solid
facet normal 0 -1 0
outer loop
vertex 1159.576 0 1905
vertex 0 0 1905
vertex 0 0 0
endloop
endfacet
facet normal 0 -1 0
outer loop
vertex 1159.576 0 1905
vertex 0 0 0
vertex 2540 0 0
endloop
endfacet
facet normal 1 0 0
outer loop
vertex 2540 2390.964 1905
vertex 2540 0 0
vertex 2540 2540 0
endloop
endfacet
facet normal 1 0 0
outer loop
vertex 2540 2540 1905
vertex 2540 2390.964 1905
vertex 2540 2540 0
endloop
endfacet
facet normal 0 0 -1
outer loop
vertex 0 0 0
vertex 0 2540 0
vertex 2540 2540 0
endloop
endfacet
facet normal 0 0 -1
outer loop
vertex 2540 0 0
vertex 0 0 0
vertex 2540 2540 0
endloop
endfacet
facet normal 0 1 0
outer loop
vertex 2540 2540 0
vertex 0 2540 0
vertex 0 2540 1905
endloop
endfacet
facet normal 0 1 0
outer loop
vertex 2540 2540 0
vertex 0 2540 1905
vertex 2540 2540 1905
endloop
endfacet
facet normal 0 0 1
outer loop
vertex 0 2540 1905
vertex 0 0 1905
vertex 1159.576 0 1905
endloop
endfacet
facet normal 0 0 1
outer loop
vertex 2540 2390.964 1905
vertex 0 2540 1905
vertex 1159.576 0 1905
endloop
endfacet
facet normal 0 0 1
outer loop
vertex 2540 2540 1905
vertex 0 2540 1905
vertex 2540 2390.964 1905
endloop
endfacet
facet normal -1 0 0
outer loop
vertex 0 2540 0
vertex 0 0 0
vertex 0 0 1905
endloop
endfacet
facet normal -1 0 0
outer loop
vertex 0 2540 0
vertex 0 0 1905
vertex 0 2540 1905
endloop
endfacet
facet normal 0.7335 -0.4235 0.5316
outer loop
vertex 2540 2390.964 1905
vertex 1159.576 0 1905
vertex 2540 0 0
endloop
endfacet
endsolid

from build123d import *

# Parameters (mm, degrees)
F0_W     = 2540
F0_H     = 2540
F1_DEPTH = 1905
F5_DEPTH = 1012.6056644313


with BuildPart() as f1:
    # F0 (on Top) → F1 (new body)
    with BuildSketch(Plane.XY):
        with Locations((1270, 1270)):
            Rectangle(F0_W, F0_H)
    extrude(amount=F1_DEPTH)

    # F4 (on 3pt) → F5 (cut, through all)
    with BuildSketch(Plane(origin=(1366.7489730037, -789.0928874783, 990.3898480668), x_dir=(0.3429406498, 0.9058899589, 0.2485057203), z_dir=(0.7335462813, -0.423513143, 0.531551005))):
        Polygon((871.0692503954, 862.1706260274), (871.0692503954, -1490.401278041), (3510.4228974704, 52.1764402953), (2273.0055313539, 431.9288364886), (1677.601780615, 614.6529579022), align=None)
    extrude(amount=F5_DEPTH, mode=Mode.SUBTRACT)


solid = f1.part
